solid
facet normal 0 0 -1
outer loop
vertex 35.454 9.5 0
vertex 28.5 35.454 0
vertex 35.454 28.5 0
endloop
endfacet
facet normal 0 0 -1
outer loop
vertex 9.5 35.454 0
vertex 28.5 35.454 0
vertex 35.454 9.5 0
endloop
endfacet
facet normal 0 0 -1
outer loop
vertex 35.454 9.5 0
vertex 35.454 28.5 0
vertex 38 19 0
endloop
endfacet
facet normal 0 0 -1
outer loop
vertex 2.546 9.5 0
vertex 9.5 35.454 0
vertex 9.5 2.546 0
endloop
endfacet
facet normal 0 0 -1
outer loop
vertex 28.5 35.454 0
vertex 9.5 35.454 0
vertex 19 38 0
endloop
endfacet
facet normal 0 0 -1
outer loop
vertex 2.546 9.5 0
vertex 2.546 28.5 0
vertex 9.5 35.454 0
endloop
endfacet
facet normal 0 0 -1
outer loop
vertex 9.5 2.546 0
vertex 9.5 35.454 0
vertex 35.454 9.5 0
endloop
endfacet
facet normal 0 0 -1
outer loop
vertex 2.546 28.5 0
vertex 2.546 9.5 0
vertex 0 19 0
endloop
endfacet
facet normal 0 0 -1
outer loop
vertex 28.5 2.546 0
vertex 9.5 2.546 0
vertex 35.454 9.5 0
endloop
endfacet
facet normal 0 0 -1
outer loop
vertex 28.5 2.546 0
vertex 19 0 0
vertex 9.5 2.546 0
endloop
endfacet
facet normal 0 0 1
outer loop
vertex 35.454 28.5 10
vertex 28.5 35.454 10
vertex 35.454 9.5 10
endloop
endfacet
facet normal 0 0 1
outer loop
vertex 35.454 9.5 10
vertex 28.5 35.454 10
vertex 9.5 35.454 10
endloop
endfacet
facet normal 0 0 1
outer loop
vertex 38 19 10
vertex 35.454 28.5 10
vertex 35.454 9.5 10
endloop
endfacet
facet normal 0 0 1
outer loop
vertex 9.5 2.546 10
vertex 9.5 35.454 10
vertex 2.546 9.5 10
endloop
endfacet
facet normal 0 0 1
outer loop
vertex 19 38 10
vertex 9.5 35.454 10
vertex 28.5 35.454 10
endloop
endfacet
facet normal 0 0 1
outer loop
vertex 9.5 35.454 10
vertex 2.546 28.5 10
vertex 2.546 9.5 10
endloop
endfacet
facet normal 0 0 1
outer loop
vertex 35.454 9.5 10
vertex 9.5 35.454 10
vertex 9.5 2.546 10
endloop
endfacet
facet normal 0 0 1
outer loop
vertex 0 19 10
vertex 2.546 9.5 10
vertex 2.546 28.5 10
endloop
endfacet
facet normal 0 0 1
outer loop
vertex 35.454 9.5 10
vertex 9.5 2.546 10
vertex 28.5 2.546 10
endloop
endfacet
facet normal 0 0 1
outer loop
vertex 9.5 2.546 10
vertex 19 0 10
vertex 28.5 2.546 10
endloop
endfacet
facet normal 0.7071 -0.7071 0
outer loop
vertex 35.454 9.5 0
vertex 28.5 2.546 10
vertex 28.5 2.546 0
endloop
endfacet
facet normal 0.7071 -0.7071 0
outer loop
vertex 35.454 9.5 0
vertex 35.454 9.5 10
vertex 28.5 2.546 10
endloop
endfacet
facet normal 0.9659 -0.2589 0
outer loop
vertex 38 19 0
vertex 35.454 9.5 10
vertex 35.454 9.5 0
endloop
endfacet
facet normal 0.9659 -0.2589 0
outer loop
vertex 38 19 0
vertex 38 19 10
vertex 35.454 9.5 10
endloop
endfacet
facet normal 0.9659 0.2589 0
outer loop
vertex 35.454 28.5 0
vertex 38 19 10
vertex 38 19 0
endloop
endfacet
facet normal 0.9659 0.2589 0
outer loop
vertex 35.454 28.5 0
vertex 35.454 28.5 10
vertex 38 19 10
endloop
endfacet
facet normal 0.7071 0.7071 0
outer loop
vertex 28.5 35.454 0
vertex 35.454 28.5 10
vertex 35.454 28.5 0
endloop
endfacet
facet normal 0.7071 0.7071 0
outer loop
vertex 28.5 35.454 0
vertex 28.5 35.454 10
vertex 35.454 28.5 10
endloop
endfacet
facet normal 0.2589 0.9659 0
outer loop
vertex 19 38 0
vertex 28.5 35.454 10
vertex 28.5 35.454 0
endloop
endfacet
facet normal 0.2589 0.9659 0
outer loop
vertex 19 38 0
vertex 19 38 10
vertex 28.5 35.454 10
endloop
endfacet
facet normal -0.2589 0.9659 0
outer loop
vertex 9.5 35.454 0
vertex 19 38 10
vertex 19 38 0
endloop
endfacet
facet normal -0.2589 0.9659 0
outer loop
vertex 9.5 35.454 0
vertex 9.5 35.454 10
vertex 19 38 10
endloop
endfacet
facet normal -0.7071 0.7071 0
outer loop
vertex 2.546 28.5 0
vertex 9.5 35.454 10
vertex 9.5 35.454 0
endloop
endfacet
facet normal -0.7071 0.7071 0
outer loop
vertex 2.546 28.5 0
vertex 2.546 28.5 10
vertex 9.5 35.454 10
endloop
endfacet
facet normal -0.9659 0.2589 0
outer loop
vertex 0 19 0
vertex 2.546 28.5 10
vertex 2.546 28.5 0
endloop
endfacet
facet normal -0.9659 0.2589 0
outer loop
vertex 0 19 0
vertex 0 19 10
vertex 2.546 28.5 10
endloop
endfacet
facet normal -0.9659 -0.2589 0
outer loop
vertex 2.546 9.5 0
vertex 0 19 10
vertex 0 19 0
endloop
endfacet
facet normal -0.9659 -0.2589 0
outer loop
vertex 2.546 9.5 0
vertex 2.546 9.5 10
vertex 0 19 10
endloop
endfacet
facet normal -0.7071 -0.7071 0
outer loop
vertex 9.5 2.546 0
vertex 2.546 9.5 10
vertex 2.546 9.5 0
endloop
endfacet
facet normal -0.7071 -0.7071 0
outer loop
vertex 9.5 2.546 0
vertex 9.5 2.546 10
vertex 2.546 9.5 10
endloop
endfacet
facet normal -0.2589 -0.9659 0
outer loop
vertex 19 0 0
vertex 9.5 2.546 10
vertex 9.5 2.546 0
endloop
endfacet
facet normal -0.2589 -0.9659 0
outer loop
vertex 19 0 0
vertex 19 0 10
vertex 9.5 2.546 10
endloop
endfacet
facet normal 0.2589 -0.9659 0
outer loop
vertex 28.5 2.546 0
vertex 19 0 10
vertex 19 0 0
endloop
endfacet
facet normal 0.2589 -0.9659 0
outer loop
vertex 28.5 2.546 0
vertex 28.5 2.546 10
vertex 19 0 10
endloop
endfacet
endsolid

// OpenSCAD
$fn = 32;

// ----------------------------------------------------------------------
// Eccentric disc: egg, 10 mm thick
// ----------------------------------------------------------------------

// --- parameters (mm) ---
profile_height = 10;      // extrusion height
profile_points = 12;      // points of the closed outline

profile = [[0, 19], [2.546, 9.5], [9.5, 2.546], [19, 0], [28.5, 2.546], [35.454, 9.5], [38, 19], [35.454, 28.5], [28.5, 35.454], [19, 38], [9.5, 35.454], [2.546, 28.5]];  // single closed polygon, 12 points, counter clockwise

// --- the one profile operation ---
linear_extrude(height = profile_height) polygon(points = profile);
